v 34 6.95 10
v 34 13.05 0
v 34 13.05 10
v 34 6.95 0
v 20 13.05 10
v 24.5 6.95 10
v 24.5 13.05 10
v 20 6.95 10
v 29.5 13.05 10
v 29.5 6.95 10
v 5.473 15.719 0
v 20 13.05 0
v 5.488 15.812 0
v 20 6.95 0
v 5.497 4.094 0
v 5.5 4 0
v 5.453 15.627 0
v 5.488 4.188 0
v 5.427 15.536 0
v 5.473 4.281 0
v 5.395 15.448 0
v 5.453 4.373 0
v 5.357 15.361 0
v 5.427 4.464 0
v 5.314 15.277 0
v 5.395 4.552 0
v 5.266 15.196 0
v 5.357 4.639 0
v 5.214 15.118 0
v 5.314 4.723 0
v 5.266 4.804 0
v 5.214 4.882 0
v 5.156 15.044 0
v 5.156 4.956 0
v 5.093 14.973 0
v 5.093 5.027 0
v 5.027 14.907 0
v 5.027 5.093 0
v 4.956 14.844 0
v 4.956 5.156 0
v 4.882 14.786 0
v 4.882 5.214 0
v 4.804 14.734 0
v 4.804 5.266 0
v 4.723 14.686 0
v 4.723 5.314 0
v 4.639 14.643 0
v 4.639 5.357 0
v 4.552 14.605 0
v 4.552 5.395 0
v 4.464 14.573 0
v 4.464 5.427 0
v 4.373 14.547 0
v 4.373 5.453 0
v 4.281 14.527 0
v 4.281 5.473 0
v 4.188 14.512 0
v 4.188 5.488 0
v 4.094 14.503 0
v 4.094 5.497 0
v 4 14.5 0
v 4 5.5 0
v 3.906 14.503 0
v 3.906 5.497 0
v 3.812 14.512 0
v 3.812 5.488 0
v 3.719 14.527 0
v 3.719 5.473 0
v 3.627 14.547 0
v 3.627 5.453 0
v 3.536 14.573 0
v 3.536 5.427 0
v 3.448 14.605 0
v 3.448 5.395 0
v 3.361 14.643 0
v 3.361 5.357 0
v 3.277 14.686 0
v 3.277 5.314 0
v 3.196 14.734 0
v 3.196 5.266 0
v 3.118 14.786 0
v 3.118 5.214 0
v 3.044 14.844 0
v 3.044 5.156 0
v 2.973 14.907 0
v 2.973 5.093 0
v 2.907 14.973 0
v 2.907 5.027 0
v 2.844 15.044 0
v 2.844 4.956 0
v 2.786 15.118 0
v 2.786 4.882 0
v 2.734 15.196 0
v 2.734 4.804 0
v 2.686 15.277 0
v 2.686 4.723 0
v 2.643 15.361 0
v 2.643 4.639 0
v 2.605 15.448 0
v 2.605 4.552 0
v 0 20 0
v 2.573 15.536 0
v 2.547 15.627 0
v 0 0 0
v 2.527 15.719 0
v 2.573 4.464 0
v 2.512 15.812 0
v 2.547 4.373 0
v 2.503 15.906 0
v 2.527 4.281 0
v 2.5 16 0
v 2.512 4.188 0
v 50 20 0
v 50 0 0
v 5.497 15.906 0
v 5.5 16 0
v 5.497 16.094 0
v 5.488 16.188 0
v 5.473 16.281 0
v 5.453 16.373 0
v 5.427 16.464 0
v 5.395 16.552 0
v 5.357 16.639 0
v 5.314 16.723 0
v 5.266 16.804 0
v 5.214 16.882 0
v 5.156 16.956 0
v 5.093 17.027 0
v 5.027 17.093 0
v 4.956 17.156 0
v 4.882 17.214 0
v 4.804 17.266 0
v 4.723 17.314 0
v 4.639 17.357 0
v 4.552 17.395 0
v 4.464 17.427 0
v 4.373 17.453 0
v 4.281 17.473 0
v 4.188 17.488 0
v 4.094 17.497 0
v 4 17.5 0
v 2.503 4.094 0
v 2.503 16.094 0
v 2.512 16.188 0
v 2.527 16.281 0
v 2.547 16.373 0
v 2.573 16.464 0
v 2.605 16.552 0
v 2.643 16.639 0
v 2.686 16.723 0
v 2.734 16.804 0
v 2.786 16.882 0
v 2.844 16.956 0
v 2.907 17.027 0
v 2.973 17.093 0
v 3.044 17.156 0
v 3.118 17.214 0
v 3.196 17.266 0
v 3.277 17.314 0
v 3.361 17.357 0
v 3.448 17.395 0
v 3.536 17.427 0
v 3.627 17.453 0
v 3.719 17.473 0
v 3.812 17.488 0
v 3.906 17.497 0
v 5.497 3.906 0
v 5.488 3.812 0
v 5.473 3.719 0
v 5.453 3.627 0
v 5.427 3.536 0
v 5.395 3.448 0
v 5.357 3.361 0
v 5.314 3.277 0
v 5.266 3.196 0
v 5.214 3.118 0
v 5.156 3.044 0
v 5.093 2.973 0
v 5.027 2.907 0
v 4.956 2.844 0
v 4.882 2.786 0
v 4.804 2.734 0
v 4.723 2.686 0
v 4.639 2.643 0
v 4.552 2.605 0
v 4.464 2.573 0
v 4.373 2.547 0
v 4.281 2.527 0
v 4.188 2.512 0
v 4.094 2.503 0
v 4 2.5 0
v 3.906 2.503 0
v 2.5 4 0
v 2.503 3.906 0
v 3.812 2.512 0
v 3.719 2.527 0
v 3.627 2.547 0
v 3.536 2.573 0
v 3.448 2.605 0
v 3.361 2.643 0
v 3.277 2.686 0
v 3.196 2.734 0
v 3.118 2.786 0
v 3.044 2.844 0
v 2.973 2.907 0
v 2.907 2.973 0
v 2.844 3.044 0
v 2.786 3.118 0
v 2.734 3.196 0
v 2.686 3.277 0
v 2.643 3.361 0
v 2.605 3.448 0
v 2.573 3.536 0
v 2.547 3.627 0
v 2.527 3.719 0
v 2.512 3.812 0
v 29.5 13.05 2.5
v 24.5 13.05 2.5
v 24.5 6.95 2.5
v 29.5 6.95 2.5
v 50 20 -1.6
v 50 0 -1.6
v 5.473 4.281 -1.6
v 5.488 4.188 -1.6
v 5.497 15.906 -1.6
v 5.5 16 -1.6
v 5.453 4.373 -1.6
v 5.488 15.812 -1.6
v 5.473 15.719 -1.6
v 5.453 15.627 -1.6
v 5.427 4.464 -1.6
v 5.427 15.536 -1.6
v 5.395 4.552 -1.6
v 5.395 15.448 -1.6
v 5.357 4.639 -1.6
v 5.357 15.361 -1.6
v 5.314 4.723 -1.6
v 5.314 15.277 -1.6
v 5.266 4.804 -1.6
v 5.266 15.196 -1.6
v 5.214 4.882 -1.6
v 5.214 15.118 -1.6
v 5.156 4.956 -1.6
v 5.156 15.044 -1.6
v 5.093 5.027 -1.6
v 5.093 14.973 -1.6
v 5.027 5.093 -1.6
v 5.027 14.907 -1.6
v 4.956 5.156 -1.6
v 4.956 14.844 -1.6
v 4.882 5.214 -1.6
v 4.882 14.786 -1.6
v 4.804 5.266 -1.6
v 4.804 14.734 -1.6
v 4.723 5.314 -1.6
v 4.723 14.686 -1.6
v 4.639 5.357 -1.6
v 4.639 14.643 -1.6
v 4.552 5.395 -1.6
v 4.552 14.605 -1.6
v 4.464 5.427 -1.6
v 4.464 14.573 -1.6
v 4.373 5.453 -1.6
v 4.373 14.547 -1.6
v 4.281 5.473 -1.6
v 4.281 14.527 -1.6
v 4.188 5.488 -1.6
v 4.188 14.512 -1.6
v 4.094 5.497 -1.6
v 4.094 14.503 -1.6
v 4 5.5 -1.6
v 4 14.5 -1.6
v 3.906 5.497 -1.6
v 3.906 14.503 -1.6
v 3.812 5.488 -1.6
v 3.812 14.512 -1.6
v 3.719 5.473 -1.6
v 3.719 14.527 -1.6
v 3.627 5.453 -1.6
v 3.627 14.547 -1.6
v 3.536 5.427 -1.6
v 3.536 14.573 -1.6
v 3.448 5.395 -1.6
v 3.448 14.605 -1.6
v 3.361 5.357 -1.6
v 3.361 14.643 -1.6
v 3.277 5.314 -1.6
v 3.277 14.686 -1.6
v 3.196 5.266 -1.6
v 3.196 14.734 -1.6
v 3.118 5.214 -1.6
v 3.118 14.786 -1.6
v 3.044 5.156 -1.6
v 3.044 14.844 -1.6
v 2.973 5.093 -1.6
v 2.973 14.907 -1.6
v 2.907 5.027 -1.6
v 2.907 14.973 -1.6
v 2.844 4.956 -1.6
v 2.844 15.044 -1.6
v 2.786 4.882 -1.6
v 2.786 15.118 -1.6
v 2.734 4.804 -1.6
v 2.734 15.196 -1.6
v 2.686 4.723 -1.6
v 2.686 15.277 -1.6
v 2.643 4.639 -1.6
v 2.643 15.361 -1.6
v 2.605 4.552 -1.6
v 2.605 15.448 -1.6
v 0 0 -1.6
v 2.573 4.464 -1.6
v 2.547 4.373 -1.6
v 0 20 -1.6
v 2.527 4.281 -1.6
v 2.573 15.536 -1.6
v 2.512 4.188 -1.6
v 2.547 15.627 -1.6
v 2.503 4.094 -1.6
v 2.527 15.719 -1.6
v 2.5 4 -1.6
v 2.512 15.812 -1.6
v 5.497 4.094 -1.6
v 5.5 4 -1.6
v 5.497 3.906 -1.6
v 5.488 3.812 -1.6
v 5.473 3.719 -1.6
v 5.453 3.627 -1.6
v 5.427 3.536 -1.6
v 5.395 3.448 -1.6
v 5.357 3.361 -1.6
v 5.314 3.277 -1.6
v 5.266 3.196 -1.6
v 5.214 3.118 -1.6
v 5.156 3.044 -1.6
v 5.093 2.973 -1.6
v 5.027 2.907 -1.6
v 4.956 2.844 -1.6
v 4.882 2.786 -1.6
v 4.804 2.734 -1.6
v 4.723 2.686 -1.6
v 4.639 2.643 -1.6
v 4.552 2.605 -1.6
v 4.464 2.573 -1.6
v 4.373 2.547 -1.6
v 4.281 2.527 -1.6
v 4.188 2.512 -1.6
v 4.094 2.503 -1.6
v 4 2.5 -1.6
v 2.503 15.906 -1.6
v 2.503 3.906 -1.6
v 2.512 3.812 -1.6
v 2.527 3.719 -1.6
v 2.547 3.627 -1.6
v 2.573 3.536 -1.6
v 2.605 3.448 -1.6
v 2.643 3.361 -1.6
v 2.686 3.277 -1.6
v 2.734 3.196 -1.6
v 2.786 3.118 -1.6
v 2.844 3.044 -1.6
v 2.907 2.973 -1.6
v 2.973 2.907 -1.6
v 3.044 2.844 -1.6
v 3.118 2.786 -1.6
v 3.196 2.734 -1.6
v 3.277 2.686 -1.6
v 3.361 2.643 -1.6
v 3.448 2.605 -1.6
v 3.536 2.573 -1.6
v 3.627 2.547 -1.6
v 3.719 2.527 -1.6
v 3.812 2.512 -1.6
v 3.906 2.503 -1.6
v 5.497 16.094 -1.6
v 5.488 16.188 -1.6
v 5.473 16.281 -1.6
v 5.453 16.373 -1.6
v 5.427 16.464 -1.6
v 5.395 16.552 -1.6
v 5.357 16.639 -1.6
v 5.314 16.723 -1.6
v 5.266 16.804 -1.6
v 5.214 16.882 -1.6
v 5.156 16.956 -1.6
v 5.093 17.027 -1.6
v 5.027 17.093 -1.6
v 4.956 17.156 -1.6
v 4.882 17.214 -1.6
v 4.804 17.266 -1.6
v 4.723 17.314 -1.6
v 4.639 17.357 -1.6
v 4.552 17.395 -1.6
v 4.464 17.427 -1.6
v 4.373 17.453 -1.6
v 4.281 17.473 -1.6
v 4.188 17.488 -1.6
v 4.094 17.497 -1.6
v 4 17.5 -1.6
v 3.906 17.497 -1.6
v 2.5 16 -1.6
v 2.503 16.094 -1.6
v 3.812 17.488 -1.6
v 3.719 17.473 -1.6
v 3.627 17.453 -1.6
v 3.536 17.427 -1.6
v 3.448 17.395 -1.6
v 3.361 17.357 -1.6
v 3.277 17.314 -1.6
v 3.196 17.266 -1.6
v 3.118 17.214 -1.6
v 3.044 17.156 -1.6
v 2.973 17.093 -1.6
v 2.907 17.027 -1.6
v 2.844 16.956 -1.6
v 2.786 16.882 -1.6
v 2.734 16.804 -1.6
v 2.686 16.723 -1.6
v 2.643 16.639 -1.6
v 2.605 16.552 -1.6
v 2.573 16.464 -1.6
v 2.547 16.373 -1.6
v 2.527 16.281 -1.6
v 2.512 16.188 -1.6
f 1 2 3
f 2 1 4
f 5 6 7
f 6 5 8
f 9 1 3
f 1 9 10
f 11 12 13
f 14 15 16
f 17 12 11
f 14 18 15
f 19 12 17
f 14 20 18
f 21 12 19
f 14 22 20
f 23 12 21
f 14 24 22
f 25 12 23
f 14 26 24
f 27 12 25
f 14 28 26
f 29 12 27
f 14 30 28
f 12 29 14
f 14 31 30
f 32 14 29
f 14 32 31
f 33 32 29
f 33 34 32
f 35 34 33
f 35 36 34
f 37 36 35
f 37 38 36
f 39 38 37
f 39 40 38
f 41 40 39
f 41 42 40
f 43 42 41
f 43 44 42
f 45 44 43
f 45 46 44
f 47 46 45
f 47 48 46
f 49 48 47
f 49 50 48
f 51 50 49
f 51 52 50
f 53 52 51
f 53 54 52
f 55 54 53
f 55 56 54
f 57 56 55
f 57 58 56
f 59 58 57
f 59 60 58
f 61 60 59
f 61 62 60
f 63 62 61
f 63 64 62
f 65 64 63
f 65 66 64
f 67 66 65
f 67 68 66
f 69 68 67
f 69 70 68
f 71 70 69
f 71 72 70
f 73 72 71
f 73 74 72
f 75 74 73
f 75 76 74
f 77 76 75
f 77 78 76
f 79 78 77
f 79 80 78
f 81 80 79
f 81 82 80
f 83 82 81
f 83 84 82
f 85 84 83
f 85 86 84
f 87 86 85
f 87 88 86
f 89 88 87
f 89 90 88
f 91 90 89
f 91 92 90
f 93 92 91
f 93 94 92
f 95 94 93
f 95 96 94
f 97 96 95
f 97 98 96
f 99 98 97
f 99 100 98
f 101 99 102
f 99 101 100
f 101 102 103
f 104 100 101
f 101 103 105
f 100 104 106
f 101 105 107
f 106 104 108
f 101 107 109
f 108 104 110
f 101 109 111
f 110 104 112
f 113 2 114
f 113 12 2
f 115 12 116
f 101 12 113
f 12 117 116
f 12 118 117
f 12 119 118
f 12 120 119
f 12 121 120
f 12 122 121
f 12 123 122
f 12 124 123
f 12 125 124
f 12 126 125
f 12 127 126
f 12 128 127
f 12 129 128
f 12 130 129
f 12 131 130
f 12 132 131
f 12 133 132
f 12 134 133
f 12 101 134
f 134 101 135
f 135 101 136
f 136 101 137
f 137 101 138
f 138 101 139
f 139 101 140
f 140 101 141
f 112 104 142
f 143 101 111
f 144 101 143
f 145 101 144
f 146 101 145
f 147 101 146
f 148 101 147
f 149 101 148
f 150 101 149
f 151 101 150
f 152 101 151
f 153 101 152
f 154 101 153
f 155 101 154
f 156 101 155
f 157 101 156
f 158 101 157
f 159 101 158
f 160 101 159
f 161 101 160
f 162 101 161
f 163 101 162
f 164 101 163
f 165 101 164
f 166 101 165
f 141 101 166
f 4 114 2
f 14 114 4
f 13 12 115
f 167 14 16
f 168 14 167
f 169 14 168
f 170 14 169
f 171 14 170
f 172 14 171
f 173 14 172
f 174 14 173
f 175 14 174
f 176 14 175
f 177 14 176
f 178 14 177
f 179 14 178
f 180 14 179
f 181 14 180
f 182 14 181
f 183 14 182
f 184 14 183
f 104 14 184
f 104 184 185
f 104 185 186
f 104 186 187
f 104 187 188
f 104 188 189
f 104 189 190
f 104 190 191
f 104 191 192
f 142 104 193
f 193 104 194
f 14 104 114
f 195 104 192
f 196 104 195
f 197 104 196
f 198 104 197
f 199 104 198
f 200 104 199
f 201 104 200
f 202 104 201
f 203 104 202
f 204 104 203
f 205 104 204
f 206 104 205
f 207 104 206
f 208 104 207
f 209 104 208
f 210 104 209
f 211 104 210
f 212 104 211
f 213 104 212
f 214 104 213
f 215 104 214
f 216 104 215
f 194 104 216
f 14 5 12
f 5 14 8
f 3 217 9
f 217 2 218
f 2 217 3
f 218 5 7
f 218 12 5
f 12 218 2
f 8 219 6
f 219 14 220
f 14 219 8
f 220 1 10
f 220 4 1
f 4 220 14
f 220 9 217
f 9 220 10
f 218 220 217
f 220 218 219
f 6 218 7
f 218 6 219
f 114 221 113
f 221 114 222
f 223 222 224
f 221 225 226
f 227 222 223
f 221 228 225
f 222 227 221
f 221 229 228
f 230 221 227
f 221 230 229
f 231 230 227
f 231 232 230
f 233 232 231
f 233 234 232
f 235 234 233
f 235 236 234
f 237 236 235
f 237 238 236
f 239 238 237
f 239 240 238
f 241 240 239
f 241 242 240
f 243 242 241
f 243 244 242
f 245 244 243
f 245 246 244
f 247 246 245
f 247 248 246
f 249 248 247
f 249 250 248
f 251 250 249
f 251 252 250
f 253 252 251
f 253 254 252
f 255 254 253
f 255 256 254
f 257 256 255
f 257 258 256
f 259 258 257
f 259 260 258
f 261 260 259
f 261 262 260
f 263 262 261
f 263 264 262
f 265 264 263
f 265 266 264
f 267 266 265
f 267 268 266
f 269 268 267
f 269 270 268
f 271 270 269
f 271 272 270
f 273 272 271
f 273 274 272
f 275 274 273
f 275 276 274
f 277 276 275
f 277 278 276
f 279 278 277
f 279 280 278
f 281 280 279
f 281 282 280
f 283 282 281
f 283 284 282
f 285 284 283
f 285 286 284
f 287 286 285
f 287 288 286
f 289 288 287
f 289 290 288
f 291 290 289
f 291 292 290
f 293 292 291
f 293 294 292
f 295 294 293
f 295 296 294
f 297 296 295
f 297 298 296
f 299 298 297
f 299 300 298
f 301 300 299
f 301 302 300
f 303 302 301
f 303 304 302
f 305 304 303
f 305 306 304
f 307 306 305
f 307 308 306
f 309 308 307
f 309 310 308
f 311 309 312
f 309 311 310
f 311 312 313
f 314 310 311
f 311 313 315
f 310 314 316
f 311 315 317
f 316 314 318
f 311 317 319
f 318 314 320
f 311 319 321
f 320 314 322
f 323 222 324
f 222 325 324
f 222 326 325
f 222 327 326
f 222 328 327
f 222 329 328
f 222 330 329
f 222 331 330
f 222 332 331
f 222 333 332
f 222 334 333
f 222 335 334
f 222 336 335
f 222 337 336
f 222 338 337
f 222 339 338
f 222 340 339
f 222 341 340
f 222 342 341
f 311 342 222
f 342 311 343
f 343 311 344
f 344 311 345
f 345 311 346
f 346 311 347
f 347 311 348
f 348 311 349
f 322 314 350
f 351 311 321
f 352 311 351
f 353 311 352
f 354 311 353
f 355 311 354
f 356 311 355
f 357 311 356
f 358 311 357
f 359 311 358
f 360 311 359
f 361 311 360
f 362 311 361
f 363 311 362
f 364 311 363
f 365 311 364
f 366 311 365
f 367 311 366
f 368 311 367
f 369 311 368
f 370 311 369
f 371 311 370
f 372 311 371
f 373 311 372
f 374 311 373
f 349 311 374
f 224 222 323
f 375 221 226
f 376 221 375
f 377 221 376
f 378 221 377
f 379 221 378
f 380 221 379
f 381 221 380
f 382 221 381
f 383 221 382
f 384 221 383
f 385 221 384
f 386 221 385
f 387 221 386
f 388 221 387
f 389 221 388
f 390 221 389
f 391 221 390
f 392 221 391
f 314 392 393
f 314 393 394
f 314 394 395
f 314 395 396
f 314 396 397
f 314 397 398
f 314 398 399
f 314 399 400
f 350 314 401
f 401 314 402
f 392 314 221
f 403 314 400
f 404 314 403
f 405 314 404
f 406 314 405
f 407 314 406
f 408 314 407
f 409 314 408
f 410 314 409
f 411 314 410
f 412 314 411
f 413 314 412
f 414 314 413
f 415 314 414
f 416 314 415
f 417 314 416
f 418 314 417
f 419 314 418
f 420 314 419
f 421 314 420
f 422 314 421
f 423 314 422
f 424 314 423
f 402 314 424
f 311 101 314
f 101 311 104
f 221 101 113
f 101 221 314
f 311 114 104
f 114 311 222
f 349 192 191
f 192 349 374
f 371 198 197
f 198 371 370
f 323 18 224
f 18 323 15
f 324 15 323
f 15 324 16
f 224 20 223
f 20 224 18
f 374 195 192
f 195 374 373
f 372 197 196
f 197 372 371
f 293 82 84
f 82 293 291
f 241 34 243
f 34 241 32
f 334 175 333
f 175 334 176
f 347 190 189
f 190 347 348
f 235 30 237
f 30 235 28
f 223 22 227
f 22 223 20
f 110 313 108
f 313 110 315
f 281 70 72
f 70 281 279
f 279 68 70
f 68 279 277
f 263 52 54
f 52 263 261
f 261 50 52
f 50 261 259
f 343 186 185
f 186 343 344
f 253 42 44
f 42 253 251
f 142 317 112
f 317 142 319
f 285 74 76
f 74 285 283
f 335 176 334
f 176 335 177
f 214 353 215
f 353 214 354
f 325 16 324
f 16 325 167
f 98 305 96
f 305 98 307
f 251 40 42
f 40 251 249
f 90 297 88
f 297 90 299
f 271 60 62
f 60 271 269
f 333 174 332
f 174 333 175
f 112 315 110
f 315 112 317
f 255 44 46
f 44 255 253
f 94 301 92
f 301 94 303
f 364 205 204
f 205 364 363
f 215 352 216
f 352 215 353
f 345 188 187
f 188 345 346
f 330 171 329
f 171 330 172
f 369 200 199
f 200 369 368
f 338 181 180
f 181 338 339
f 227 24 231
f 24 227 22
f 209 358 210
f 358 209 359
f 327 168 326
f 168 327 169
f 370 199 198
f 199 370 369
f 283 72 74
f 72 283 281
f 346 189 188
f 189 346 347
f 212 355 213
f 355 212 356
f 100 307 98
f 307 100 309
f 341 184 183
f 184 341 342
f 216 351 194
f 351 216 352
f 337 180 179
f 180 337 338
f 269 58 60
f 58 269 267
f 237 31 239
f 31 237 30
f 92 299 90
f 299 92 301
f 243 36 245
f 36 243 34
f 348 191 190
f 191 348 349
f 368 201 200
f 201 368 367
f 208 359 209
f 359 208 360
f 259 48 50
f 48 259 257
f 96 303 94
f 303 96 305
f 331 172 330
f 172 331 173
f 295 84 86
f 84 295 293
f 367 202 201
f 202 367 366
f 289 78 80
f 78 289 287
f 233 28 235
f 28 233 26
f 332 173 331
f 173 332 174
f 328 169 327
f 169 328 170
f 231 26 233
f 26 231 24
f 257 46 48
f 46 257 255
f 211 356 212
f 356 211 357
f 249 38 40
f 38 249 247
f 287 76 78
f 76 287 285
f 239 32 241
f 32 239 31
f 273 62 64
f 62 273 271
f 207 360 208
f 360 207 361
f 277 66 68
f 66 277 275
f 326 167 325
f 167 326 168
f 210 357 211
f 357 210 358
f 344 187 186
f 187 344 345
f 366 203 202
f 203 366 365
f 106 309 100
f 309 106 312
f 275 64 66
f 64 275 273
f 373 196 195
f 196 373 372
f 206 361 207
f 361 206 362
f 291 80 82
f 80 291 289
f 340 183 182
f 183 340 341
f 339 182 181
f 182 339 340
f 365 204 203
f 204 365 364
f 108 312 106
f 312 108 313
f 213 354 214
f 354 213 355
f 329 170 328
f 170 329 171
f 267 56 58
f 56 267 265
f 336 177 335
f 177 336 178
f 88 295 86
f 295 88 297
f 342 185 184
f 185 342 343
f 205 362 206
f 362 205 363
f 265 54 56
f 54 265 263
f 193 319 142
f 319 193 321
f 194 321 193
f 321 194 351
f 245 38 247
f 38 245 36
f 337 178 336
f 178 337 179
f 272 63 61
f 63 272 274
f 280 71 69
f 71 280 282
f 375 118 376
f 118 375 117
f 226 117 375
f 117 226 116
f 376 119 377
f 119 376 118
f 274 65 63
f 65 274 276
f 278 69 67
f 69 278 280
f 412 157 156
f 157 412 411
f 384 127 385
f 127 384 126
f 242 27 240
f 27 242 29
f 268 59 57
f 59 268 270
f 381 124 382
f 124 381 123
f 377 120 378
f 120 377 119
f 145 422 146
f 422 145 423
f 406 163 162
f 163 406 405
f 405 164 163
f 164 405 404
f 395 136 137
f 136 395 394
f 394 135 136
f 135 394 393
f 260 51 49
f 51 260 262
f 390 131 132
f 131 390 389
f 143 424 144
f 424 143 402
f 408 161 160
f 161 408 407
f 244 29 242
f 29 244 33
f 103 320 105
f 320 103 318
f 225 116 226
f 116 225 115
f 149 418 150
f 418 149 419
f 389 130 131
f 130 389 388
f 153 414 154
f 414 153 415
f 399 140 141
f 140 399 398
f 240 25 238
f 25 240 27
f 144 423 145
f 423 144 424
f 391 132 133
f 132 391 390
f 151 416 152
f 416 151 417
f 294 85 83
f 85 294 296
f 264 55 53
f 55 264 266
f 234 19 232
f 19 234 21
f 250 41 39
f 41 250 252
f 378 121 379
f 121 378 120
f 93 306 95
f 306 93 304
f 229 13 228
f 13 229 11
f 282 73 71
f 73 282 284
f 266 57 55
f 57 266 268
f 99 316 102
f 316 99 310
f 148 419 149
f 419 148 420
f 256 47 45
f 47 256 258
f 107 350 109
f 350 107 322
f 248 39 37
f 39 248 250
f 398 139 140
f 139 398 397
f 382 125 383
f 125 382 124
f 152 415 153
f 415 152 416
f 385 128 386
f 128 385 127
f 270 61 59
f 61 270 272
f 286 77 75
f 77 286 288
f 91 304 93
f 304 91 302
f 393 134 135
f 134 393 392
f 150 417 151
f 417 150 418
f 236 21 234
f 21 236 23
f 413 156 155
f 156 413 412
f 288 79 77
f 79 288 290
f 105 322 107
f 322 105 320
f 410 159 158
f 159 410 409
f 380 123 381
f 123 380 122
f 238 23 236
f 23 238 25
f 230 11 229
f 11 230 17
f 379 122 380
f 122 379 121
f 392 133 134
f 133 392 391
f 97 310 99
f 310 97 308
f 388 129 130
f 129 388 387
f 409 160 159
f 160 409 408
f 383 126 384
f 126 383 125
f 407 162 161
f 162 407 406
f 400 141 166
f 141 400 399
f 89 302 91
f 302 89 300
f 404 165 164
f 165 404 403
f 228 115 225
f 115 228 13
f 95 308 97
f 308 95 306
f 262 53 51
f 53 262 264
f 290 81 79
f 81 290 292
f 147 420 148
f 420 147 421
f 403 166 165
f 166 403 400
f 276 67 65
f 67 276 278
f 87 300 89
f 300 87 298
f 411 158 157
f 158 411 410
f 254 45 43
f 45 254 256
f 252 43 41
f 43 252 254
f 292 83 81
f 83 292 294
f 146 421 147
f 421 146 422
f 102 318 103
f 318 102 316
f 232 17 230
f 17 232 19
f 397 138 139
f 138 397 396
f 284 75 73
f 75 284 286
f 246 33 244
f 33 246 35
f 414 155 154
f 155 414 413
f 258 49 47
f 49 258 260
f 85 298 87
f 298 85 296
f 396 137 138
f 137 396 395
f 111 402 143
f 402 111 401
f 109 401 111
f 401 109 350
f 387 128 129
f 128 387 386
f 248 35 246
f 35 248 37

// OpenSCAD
translate([20,6.95,0])
	difference()
	{
		color("black",a=1.0)
			cube([14,6.1,10]);
		translate([4.5,-0.5,2.5])
			color("gray",a=1.0)
				cube([5,7,8]);
	}
difference()
{
	translate([0,0,-1.6])
		color("green",a=1.0)
			cube([50,20,1.6]);
	translate([4,4,-2])
		cylinder(h=2.5,r=1.5,$fn=100);
	translate([4,16,-2])
		cylinder(h=2.5,r=1.5,$fn=100);
}
